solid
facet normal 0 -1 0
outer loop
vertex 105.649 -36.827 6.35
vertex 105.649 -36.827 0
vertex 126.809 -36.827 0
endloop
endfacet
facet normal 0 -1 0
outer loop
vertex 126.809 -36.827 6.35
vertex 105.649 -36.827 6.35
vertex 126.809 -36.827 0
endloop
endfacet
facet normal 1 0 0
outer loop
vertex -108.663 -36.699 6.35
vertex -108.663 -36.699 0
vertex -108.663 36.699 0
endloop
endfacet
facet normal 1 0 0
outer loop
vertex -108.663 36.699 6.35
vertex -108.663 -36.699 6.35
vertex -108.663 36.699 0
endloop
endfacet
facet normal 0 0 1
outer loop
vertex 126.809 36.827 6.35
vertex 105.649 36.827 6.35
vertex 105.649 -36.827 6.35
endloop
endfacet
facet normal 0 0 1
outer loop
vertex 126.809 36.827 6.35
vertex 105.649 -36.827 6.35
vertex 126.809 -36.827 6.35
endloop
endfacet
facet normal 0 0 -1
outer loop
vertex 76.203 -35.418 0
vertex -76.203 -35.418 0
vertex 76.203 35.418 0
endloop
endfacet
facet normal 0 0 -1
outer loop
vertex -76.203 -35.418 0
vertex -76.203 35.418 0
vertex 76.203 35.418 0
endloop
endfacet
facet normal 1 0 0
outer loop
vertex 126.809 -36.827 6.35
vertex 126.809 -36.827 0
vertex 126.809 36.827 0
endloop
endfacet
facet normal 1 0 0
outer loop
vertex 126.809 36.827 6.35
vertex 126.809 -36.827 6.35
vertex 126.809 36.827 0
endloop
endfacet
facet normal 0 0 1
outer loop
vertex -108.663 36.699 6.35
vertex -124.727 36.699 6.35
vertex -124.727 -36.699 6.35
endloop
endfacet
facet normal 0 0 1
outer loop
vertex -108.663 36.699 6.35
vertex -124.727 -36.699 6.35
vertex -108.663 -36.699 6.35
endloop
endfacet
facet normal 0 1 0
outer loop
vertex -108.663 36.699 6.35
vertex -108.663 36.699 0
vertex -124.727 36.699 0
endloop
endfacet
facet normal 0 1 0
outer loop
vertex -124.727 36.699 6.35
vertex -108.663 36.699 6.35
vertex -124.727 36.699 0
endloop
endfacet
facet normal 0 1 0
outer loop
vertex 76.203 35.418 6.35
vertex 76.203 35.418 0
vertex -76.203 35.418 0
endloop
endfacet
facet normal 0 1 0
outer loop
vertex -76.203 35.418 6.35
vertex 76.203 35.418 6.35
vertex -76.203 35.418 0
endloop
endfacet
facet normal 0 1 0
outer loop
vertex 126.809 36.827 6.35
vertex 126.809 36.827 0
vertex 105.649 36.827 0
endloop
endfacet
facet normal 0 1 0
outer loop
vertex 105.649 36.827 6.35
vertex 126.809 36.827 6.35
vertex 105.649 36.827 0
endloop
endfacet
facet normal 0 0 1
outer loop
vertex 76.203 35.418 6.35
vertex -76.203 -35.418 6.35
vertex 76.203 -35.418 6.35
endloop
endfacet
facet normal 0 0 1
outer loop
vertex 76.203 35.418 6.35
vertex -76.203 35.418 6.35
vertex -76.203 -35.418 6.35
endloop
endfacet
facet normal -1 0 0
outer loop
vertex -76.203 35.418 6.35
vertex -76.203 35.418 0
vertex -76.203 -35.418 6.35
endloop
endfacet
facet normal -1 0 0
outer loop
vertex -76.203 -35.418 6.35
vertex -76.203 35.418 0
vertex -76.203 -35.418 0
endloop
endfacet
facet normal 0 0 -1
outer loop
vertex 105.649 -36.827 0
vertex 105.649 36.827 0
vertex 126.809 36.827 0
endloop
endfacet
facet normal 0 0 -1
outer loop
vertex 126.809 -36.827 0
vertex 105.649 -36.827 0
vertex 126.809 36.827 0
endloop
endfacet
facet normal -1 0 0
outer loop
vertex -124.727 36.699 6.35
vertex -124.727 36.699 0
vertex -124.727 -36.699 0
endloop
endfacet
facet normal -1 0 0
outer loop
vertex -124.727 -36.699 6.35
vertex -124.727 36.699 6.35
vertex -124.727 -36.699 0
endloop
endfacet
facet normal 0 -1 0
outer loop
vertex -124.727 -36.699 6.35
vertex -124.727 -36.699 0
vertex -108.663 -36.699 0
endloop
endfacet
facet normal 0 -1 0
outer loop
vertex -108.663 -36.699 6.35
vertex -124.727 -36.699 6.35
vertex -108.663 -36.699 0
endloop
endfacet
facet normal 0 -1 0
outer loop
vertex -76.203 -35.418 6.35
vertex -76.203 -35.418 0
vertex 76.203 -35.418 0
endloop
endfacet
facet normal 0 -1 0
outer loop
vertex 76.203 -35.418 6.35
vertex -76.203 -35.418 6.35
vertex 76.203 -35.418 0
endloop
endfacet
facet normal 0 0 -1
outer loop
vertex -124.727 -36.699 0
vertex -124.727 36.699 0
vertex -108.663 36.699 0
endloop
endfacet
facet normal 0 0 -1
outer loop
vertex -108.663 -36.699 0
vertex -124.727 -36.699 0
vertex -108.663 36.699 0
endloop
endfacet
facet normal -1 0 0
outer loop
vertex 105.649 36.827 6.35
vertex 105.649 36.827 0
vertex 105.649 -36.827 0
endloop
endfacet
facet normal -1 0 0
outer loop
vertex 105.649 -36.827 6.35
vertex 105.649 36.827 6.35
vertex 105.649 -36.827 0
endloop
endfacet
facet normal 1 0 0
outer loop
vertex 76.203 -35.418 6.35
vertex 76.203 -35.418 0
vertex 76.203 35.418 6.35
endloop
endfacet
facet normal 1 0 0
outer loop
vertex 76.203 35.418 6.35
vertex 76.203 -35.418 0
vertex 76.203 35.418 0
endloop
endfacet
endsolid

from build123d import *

# Parameters (mm, degrees)
F1_DEPTH = 6.35


with BuildPart() as f1:
    # F0 (on Top) → F1 (new body)
    with BuildSketch(Plane.XY):
        Polygon((-76.202936, 0.319925), (-76.202936, -35.418112), (76.202936, -35.418112), (76.202936, 0), (0, 0), align=None)
        Polygon((-108.662523, -36.698528), (-108.662523, 0.456201), (-108.662523, 36.698528), (-124.727227, 36.698528), (-124.727227, -36.698528), align=None)
        Polygon((105.649054, 36.827162), (105.649054, 0), (105.649054, -36.827162), (126.808733, -36.827162), (126.808733, 36.827162), align=None)
        Polygon((-76.202936, 35.418112), (-76.202936, 0.319925), (0, 0), (76.202936, 0), (76.202936, 35.418112), align=None)
    extrude(amount=F1_DEPTH)


solid = f1.part
